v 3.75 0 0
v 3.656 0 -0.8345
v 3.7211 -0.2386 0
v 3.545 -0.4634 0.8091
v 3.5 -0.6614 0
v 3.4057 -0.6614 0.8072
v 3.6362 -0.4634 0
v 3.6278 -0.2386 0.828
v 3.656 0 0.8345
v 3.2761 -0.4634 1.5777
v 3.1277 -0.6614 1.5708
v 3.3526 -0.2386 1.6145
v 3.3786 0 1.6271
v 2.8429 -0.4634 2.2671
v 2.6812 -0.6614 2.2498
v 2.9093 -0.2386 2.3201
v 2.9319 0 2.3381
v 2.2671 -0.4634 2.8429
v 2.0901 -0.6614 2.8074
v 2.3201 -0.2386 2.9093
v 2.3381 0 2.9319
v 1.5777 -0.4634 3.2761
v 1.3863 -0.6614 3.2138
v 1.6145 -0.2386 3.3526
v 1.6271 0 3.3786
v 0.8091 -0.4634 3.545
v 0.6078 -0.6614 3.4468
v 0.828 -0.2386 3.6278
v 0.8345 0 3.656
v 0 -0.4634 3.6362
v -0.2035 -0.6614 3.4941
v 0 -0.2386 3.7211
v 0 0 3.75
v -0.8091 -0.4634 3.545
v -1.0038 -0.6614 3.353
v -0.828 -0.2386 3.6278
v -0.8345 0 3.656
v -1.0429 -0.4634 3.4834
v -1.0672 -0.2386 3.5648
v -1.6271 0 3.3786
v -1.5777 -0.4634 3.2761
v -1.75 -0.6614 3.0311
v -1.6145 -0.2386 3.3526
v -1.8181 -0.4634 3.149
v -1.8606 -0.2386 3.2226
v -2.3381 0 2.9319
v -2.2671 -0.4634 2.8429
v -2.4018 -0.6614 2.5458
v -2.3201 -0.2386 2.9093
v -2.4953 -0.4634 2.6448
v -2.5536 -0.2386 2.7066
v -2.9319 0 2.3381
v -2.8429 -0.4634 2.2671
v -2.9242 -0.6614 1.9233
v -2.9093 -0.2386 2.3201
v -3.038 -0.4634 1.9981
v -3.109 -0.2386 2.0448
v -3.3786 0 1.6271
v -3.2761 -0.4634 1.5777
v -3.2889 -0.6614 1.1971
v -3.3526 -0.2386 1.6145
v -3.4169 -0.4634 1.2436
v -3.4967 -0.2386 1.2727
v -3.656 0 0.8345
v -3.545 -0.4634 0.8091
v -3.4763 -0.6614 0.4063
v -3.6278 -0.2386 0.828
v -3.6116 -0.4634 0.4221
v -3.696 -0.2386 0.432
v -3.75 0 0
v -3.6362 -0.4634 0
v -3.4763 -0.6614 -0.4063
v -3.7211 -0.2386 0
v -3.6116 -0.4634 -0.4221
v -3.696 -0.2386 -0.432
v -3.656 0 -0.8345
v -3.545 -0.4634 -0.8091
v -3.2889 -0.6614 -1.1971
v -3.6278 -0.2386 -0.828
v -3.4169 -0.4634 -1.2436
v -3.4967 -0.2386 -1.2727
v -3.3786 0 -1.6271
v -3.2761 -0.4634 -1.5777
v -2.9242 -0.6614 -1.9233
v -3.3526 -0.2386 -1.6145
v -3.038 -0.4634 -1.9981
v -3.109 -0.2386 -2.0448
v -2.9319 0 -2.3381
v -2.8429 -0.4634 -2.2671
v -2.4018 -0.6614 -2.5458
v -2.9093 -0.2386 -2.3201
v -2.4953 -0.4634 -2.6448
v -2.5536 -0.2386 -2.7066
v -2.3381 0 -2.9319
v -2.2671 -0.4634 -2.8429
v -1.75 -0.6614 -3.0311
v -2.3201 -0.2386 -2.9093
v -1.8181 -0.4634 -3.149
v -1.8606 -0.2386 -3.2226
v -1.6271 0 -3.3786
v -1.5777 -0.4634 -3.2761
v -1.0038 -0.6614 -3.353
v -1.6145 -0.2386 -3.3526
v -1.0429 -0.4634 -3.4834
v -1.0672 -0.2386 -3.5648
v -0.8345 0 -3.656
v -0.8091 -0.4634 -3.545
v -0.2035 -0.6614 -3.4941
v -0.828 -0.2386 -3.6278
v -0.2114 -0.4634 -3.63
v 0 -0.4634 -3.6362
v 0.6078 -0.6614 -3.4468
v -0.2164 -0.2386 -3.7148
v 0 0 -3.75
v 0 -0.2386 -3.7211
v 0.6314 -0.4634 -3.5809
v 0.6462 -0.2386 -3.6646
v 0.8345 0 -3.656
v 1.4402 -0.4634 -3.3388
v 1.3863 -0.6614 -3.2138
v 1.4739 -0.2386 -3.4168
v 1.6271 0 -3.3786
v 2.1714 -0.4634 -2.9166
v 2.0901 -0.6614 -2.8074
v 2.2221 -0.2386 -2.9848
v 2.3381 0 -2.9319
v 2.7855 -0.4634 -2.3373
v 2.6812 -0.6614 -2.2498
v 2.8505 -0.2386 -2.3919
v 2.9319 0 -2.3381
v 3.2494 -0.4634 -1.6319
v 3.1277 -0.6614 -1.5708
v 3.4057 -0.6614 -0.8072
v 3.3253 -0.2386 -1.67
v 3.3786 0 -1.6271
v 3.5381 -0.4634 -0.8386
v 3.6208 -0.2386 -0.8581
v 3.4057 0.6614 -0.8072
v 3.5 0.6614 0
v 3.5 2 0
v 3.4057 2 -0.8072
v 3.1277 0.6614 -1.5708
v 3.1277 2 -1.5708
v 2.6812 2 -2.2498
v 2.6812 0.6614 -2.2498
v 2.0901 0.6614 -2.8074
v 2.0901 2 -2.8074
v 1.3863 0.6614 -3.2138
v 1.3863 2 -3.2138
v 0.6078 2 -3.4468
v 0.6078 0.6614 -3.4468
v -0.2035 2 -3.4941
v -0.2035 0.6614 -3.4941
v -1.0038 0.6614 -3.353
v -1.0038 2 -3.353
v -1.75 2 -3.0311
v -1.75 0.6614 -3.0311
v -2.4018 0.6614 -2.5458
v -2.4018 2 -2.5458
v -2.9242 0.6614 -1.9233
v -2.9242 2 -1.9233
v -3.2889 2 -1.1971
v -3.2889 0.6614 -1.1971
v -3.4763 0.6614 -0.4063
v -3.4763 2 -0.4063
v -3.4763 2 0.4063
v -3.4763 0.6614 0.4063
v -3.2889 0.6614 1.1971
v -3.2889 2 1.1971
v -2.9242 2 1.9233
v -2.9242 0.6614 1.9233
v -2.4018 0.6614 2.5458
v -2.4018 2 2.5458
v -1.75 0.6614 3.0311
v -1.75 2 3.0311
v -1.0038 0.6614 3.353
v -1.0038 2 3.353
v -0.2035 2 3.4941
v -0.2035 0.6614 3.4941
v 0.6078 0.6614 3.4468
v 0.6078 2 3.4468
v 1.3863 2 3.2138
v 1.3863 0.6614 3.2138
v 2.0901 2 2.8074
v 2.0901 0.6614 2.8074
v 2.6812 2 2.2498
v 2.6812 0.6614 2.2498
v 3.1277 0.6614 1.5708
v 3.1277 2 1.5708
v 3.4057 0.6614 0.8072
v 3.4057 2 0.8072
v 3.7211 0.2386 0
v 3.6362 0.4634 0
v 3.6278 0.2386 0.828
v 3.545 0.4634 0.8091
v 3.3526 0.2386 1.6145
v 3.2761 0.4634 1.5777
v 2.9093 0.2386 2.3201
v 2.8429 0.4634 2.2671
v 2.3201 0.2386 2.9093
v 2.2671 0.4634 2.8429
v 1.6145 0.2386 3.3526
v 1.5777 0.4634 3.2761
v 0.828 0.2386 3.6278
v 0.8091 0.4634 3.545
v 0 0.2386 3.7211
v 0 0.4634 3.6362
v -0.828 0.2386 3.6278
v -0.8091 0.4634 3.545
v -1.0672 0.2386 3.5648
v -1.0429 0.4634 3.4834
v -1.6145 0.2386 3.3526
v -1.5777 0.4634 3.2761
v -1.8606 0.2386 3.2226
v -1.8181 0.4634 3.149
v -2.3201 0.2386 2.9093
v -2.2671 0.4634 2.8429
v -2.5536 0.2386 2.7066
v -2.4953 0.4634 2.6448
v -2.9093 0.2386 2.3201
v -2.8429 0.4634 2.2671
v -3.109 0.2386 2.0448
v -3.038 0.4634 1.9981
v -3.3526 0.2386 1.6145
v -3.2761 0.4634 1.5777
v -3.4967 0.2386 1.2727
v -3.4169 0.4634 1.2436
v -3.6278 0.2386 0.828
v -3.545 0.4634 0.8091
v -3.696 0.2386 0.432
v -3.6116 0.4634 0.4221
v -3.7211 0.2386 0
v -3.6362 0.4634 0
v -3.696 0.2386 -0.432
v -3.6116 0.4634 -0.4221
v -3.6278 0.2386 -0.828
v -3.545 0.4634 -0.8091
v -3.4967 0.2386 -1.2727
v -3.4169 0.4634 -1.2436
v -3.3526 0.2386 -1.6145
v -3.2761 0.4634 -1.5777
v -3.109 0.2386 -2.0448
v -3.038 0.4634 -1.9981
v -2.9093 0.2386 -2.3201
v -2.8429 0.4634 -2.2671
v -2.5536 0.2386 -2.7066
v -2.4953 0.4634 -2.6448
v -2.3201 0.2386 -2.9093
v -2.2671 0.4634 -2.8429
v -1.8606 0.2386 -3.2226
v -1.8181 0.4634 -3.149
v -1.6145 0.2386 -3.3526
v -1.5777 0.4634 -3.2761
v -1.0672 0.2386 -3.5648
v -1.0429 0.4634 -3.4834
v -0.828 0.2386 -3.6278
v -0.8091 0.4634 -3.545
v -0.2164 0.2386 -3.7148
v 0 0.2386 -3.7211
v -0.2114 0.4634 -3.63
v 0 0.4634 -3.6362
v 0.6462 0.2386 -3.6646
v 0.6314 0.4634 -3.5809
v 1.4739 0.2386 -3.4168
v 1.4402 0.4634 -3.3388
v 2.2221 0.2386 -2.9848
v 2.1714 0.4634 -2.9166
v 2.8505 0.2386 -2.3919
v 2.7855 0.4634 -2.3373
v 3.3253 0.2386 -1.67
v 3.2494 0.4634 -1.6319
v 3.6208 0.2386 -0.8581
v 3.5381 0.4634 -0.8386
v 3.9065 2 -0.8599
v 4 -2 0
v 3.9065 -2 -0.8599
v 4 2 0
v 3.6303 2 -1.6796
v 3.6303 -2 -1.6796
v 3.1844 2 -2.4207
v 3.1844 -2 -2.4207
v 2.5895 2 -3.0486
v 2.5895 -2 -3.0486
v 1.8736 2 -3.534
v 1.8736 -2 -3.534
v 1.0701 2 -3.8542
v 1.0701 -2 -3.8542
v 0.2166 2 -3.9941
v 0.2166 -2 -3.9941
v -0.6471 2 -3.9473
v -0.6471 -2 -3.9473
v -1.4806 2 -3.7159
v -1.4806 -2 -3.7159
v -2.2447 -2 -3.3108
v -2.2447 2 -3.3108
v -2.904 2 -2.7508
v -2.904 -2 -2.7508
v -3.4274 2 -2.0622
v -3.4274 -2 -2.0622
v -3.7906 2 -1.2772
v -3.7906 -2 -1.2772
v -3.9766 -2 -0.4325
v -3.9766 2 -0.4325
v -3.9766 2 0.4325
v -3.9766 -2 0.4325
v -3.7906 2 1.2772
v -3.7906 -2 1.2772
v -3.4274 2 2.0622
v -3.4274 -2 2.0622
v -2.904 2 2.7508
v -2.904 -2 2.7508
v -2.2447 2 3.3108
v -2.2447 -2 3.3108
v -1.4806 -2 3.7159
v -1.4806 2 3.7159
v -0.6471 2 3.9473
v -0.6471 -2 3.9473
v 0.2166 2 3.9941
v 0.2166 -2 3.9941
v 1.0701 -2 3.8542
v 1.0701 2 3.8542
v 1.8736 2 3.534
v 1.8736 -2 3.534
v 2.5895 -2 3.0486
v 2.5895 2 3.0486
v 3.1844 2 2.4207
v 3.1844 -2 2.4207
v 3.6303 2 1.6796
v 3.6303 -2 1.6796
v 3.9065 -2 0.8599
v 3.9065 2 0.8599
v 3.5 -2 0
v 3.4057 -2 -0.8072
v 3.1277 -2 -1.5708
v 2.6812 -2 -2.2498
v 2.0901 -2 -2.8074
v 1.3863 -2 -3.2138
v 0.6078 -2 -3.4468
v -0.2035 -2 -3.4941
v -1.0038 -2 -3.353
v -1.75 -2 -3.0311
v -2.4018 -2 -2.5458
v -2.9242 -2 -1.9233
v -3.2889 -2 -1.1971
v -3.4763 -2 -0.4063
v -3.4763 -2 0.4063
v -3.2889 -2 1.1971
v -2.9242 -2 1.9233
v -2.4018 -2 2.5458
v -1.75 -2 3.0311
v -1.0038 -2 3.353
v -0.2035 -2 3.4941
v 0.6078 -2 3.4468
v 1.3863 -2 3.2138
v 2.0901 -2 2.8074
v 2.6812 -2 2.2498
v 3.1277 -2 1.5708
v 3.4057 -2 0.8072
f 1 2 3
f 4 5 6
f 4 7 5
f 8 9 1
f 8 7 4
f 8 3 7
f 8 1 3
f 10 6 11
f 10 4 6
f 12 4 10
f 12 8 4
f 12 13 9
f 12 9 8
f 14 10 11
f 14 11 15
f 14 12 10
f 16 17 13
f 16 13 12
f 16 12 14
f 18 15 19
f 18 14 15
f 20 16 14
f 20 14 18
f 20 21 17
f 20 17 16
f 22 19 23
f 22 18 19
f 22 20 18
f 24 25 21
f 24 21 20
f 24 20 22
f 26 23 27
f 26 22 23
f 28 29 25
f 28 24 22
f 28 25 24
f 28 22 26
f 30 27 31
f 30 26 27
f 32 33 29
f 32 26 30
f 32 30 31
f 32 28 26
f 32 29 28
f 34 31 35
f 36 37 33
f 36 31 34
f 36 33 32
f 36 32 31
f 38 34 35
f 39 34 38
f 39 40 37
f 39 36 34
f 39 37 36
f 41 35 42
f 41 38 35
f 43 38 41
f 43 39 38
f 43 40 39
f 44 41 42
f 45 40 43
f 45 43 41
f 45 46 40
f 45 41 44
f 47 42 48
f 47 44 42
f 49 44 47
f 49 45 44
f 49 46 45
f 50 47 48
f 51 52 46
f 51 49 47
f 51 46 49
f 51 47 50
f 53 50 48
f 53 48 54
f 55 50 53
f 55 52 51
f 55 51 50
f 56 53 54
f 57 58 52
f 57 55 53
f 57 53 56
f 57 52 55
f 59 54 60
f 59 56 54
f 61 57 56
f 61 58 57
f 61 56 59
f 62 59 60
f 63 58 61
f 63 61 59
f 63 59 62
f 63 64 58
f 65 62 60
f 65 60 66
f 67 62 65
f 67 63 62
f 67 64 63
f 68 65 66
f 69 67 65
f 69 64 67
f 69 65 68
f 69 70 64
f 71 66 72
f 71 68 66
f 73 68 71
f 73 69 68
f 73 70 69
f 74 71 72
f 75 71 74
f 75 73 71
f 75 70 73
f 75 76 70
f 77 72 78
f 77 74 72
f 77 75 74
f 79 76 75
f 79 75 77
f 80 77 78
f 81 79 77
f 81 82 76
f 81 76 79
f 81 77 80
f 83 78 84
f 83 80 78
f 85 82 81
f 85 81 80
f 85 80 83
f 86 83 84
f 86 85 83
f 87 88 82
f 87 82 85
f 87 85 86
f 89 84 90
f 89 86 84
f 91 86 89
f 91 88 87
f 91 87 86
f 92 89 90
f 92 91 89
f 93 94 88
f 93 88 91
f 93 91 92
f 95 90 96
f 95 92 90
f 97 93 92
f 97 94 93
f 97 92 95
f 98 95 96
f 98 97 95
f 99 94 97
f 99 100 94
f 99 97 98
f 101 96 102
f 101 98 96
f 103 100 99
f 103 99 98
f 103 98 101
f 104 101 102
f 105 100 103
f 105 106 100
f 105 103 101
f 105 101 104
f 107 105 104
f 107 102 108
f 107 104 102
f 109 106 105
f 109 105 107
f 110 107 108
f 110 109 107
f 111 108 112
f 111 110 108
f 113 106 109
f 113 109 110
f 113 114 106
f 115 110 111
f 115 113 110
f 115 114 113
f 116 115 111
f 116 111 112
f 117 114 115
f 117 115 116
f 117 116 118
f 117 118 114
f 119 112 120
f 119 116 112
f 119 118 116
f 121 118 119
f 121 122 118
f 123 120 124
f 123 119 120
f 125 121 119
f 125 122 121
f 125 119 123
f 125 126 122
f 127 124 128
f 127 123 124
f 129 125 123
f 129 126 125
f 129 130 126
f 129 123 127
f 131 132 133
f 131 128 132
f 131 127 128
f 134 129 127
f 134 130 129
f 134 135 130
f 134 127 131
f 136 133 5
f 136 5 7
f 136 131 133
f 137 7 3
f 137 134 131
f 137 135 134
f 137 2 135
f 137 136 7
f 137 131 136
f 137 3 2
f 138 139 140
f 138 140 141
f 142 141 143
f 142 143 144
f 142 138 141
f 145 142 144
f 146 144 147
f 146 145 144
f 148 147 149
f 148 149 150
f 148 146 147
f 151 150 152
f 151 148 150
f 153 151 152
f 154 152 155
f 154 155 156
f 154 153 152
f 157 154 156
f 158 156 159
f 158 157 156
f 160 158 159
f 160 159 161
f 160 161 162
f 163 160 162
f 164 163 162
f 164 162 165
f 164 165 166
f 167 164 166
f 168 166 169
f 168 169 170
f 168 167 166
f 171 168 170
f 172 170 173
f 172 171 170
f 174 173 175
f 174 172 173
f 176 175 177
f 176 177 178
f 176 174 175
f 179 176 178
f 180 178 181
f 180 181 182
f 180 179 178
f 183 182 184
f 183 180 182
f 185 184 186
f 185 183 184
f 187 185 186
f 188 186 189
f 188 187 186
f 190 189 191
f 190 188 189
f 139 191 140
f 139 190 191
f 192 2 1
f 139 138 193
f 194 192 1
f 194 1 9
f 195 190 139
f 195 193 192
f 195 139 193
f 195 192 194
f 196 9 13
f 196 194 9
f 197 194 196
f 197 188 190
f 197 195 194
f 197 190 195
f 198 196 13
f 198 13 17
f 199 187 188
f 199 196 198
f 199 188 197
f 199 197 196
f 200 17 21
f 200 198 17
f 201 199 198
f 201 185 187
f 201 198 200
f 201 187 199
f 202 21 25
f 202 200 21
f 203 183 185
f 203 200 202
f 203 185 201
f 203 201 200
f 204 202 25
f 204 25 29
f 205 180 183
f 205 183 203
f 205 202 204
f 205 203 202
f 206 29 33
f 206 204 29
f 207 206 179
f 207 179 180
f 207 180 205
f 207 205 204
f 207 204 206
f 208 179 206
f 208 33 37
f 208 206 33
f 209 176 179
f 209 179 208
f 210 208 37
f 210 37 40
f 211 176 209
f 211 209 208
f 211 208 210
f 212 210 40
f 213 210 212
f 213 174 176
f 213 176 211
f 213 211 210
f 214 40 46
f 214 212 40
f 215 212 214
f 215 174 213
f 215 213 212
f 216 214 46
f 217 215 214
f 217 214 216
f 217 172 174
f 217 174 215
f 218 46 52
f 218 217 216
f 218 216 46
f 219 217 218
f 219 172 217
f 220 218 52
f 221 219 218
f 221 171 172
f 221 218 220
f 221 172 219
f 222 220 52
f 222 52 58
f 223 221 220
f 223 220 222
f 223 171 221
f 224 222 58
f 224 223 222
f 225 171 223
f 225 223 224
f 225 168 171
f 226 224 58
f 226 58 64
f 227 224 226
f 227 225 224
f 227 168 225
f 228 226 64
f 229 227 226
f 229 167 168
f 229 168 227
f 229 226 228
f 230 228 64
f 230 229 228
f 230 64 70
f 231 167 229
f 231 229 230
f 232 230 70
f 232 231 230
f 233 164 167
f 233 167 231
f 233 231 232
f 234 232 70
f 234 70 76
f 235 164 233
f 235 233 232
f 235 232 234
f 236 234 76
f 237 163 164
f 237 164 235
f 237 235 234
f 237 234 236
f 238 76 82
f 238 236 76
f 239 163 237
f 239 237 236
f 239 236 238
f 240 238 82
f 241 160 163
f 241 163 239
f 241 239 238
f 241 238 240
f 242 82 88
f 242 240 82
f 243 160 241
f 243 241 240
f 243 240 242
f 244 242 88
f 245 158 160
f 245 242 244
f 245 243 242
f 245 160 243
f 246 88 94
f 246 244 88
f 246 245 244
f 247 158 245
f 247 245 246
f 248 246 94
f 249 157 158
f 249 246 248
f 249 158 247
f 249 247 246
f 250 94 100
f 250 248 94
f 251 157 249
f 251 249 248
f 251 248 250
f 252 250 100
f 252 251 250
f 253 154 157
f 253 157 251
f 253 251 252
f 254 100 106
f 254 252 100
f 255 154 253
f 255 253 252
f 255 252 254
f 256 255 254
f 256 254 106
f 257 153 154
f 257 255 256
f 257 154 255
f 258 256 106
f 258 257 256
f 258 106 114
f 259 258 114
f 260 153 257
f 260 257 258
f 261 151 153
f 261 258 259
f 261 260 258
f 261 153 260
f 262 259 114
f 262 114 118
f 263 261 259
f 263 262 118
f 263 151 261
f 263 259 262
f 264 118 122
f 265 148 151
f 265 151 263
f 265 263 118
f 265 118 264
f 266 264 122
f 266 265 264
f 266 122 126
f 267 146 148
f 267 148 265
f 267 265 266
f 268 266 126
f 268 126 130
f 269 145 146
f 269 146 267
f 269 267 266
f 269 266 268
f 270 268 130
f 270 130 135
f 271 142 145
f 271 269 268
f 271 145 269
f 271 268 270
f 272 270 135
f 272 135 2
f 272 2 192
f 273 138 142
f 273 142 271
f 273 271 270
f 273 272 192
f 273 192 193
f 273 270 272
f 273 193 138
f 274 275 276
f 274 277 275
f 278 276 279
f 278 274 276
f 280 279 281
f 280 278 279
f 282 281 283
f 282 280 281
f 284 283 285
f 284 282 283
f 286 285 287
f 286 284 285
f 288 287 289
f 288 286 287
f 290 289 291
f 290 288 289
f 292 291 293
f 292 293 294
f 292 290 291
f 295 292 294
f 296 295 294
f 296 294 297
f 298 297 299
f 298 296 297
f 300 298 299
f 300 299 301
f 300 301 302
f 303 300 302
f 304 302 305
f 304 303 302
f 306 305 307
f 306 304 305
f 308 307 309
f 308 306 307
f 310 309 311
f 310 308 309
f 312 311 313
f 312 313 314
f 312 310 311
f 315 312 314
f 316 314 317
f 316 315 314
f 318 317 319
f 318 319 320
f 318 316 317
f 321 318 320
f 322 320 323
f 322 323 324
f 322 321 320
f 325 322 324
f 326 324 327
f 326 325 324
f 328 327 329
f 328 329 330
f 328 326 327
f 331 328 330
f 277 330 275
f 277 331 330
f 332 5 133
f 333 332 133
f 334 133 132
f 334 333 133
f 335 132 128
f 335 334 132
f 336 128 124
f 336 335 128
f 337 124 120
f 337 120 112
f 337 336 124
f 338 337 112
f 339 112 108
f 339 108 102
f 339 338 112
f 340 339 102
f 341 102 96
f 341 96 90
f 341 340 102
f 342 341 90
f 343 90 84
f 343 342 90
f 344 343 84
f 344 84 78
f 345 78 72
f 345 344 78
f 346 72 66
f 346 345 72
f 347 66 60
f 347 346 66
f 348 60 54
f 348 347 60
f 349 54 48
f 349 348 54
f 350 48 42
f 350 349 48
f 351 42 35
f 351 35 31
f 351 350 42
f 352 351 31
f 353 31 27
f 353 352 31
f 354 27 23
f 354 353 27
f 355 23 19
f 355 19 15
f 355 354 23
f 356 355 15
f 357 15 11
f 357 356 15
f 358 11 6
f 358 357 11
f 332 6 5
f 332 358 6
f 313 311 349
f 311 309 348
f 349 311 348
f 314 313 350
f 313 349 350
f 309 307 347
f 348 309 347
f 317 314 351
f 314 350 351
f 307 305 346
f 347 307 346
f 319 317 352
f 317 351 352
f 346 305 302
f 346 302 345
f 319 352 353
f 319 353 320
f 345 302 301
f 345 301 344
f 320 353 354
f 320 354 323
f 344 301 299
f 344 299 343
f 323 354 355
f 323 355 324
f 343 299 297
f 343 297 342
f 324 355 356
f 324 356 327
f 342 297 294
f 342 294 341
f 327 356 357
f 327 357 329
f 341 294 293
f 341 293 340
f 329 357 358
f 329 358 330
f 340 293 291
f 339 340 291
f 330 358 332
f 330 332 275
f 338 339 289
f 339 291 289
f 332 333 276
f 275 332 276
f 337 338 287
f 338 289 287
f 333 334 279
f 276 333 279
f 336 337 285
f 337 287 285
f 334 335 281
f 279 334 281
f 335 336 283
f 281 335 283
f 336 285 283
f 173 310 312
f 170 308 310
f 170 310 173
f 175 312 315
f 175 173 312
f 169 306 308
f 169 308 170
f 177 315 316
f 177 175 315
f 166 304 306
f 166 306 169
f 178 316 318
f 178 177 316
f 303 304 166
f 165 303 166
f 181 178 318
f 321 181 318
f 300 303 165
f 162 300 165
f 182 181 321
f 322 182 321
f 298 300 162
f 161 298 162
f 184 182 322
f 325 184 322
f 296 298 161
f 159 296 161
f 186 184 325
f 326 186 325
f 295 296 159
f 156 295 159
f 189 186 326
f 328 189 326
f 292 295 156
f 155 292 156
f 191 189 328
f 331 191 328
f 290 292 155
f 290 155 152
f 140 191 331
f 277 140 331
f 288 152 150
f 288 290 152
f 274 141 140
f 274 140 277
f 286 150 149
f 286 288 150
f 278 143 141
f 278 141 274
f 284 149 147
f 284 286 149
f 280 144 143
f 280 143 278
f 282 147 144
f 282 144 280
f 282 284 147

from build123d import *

# Parameters (mm, degrees)
DIAPROFILES_R         = 4
DIAPROFILES_R_2       = 3.5
DIAPROFILE_DEPTH      = 2
BEARINGPATHPROFILES_R = 1


with BuildPart() as part:
    # DiaProfileS → DiaProfile (new body, symmetric)
    with BuildSketch(Plane(origin=(0, 0, 0), x_dir=(1, 0, 0), z_dir=(0, 1, 0))):
        Circle(DIAPROFILES_R)
        Circle(DIAPROFILES_R_2, mode=Mode.SUBTRACT)
    extrude(amount=DIAPROFILE_DEPTH, both=True)

    # BearingPathProfileS → BearingPathProfile (revolve, cut)
    with BuildSketch(Plane.XY):
        with Locations((2.75, 0)):
            Circle(BEARINGPATHPROFILES_R)
    revolve(axis=Axis((0, 2, 0), (0, -1, 0)), mode=Mode.SUBTRACT)


solid = part.part
